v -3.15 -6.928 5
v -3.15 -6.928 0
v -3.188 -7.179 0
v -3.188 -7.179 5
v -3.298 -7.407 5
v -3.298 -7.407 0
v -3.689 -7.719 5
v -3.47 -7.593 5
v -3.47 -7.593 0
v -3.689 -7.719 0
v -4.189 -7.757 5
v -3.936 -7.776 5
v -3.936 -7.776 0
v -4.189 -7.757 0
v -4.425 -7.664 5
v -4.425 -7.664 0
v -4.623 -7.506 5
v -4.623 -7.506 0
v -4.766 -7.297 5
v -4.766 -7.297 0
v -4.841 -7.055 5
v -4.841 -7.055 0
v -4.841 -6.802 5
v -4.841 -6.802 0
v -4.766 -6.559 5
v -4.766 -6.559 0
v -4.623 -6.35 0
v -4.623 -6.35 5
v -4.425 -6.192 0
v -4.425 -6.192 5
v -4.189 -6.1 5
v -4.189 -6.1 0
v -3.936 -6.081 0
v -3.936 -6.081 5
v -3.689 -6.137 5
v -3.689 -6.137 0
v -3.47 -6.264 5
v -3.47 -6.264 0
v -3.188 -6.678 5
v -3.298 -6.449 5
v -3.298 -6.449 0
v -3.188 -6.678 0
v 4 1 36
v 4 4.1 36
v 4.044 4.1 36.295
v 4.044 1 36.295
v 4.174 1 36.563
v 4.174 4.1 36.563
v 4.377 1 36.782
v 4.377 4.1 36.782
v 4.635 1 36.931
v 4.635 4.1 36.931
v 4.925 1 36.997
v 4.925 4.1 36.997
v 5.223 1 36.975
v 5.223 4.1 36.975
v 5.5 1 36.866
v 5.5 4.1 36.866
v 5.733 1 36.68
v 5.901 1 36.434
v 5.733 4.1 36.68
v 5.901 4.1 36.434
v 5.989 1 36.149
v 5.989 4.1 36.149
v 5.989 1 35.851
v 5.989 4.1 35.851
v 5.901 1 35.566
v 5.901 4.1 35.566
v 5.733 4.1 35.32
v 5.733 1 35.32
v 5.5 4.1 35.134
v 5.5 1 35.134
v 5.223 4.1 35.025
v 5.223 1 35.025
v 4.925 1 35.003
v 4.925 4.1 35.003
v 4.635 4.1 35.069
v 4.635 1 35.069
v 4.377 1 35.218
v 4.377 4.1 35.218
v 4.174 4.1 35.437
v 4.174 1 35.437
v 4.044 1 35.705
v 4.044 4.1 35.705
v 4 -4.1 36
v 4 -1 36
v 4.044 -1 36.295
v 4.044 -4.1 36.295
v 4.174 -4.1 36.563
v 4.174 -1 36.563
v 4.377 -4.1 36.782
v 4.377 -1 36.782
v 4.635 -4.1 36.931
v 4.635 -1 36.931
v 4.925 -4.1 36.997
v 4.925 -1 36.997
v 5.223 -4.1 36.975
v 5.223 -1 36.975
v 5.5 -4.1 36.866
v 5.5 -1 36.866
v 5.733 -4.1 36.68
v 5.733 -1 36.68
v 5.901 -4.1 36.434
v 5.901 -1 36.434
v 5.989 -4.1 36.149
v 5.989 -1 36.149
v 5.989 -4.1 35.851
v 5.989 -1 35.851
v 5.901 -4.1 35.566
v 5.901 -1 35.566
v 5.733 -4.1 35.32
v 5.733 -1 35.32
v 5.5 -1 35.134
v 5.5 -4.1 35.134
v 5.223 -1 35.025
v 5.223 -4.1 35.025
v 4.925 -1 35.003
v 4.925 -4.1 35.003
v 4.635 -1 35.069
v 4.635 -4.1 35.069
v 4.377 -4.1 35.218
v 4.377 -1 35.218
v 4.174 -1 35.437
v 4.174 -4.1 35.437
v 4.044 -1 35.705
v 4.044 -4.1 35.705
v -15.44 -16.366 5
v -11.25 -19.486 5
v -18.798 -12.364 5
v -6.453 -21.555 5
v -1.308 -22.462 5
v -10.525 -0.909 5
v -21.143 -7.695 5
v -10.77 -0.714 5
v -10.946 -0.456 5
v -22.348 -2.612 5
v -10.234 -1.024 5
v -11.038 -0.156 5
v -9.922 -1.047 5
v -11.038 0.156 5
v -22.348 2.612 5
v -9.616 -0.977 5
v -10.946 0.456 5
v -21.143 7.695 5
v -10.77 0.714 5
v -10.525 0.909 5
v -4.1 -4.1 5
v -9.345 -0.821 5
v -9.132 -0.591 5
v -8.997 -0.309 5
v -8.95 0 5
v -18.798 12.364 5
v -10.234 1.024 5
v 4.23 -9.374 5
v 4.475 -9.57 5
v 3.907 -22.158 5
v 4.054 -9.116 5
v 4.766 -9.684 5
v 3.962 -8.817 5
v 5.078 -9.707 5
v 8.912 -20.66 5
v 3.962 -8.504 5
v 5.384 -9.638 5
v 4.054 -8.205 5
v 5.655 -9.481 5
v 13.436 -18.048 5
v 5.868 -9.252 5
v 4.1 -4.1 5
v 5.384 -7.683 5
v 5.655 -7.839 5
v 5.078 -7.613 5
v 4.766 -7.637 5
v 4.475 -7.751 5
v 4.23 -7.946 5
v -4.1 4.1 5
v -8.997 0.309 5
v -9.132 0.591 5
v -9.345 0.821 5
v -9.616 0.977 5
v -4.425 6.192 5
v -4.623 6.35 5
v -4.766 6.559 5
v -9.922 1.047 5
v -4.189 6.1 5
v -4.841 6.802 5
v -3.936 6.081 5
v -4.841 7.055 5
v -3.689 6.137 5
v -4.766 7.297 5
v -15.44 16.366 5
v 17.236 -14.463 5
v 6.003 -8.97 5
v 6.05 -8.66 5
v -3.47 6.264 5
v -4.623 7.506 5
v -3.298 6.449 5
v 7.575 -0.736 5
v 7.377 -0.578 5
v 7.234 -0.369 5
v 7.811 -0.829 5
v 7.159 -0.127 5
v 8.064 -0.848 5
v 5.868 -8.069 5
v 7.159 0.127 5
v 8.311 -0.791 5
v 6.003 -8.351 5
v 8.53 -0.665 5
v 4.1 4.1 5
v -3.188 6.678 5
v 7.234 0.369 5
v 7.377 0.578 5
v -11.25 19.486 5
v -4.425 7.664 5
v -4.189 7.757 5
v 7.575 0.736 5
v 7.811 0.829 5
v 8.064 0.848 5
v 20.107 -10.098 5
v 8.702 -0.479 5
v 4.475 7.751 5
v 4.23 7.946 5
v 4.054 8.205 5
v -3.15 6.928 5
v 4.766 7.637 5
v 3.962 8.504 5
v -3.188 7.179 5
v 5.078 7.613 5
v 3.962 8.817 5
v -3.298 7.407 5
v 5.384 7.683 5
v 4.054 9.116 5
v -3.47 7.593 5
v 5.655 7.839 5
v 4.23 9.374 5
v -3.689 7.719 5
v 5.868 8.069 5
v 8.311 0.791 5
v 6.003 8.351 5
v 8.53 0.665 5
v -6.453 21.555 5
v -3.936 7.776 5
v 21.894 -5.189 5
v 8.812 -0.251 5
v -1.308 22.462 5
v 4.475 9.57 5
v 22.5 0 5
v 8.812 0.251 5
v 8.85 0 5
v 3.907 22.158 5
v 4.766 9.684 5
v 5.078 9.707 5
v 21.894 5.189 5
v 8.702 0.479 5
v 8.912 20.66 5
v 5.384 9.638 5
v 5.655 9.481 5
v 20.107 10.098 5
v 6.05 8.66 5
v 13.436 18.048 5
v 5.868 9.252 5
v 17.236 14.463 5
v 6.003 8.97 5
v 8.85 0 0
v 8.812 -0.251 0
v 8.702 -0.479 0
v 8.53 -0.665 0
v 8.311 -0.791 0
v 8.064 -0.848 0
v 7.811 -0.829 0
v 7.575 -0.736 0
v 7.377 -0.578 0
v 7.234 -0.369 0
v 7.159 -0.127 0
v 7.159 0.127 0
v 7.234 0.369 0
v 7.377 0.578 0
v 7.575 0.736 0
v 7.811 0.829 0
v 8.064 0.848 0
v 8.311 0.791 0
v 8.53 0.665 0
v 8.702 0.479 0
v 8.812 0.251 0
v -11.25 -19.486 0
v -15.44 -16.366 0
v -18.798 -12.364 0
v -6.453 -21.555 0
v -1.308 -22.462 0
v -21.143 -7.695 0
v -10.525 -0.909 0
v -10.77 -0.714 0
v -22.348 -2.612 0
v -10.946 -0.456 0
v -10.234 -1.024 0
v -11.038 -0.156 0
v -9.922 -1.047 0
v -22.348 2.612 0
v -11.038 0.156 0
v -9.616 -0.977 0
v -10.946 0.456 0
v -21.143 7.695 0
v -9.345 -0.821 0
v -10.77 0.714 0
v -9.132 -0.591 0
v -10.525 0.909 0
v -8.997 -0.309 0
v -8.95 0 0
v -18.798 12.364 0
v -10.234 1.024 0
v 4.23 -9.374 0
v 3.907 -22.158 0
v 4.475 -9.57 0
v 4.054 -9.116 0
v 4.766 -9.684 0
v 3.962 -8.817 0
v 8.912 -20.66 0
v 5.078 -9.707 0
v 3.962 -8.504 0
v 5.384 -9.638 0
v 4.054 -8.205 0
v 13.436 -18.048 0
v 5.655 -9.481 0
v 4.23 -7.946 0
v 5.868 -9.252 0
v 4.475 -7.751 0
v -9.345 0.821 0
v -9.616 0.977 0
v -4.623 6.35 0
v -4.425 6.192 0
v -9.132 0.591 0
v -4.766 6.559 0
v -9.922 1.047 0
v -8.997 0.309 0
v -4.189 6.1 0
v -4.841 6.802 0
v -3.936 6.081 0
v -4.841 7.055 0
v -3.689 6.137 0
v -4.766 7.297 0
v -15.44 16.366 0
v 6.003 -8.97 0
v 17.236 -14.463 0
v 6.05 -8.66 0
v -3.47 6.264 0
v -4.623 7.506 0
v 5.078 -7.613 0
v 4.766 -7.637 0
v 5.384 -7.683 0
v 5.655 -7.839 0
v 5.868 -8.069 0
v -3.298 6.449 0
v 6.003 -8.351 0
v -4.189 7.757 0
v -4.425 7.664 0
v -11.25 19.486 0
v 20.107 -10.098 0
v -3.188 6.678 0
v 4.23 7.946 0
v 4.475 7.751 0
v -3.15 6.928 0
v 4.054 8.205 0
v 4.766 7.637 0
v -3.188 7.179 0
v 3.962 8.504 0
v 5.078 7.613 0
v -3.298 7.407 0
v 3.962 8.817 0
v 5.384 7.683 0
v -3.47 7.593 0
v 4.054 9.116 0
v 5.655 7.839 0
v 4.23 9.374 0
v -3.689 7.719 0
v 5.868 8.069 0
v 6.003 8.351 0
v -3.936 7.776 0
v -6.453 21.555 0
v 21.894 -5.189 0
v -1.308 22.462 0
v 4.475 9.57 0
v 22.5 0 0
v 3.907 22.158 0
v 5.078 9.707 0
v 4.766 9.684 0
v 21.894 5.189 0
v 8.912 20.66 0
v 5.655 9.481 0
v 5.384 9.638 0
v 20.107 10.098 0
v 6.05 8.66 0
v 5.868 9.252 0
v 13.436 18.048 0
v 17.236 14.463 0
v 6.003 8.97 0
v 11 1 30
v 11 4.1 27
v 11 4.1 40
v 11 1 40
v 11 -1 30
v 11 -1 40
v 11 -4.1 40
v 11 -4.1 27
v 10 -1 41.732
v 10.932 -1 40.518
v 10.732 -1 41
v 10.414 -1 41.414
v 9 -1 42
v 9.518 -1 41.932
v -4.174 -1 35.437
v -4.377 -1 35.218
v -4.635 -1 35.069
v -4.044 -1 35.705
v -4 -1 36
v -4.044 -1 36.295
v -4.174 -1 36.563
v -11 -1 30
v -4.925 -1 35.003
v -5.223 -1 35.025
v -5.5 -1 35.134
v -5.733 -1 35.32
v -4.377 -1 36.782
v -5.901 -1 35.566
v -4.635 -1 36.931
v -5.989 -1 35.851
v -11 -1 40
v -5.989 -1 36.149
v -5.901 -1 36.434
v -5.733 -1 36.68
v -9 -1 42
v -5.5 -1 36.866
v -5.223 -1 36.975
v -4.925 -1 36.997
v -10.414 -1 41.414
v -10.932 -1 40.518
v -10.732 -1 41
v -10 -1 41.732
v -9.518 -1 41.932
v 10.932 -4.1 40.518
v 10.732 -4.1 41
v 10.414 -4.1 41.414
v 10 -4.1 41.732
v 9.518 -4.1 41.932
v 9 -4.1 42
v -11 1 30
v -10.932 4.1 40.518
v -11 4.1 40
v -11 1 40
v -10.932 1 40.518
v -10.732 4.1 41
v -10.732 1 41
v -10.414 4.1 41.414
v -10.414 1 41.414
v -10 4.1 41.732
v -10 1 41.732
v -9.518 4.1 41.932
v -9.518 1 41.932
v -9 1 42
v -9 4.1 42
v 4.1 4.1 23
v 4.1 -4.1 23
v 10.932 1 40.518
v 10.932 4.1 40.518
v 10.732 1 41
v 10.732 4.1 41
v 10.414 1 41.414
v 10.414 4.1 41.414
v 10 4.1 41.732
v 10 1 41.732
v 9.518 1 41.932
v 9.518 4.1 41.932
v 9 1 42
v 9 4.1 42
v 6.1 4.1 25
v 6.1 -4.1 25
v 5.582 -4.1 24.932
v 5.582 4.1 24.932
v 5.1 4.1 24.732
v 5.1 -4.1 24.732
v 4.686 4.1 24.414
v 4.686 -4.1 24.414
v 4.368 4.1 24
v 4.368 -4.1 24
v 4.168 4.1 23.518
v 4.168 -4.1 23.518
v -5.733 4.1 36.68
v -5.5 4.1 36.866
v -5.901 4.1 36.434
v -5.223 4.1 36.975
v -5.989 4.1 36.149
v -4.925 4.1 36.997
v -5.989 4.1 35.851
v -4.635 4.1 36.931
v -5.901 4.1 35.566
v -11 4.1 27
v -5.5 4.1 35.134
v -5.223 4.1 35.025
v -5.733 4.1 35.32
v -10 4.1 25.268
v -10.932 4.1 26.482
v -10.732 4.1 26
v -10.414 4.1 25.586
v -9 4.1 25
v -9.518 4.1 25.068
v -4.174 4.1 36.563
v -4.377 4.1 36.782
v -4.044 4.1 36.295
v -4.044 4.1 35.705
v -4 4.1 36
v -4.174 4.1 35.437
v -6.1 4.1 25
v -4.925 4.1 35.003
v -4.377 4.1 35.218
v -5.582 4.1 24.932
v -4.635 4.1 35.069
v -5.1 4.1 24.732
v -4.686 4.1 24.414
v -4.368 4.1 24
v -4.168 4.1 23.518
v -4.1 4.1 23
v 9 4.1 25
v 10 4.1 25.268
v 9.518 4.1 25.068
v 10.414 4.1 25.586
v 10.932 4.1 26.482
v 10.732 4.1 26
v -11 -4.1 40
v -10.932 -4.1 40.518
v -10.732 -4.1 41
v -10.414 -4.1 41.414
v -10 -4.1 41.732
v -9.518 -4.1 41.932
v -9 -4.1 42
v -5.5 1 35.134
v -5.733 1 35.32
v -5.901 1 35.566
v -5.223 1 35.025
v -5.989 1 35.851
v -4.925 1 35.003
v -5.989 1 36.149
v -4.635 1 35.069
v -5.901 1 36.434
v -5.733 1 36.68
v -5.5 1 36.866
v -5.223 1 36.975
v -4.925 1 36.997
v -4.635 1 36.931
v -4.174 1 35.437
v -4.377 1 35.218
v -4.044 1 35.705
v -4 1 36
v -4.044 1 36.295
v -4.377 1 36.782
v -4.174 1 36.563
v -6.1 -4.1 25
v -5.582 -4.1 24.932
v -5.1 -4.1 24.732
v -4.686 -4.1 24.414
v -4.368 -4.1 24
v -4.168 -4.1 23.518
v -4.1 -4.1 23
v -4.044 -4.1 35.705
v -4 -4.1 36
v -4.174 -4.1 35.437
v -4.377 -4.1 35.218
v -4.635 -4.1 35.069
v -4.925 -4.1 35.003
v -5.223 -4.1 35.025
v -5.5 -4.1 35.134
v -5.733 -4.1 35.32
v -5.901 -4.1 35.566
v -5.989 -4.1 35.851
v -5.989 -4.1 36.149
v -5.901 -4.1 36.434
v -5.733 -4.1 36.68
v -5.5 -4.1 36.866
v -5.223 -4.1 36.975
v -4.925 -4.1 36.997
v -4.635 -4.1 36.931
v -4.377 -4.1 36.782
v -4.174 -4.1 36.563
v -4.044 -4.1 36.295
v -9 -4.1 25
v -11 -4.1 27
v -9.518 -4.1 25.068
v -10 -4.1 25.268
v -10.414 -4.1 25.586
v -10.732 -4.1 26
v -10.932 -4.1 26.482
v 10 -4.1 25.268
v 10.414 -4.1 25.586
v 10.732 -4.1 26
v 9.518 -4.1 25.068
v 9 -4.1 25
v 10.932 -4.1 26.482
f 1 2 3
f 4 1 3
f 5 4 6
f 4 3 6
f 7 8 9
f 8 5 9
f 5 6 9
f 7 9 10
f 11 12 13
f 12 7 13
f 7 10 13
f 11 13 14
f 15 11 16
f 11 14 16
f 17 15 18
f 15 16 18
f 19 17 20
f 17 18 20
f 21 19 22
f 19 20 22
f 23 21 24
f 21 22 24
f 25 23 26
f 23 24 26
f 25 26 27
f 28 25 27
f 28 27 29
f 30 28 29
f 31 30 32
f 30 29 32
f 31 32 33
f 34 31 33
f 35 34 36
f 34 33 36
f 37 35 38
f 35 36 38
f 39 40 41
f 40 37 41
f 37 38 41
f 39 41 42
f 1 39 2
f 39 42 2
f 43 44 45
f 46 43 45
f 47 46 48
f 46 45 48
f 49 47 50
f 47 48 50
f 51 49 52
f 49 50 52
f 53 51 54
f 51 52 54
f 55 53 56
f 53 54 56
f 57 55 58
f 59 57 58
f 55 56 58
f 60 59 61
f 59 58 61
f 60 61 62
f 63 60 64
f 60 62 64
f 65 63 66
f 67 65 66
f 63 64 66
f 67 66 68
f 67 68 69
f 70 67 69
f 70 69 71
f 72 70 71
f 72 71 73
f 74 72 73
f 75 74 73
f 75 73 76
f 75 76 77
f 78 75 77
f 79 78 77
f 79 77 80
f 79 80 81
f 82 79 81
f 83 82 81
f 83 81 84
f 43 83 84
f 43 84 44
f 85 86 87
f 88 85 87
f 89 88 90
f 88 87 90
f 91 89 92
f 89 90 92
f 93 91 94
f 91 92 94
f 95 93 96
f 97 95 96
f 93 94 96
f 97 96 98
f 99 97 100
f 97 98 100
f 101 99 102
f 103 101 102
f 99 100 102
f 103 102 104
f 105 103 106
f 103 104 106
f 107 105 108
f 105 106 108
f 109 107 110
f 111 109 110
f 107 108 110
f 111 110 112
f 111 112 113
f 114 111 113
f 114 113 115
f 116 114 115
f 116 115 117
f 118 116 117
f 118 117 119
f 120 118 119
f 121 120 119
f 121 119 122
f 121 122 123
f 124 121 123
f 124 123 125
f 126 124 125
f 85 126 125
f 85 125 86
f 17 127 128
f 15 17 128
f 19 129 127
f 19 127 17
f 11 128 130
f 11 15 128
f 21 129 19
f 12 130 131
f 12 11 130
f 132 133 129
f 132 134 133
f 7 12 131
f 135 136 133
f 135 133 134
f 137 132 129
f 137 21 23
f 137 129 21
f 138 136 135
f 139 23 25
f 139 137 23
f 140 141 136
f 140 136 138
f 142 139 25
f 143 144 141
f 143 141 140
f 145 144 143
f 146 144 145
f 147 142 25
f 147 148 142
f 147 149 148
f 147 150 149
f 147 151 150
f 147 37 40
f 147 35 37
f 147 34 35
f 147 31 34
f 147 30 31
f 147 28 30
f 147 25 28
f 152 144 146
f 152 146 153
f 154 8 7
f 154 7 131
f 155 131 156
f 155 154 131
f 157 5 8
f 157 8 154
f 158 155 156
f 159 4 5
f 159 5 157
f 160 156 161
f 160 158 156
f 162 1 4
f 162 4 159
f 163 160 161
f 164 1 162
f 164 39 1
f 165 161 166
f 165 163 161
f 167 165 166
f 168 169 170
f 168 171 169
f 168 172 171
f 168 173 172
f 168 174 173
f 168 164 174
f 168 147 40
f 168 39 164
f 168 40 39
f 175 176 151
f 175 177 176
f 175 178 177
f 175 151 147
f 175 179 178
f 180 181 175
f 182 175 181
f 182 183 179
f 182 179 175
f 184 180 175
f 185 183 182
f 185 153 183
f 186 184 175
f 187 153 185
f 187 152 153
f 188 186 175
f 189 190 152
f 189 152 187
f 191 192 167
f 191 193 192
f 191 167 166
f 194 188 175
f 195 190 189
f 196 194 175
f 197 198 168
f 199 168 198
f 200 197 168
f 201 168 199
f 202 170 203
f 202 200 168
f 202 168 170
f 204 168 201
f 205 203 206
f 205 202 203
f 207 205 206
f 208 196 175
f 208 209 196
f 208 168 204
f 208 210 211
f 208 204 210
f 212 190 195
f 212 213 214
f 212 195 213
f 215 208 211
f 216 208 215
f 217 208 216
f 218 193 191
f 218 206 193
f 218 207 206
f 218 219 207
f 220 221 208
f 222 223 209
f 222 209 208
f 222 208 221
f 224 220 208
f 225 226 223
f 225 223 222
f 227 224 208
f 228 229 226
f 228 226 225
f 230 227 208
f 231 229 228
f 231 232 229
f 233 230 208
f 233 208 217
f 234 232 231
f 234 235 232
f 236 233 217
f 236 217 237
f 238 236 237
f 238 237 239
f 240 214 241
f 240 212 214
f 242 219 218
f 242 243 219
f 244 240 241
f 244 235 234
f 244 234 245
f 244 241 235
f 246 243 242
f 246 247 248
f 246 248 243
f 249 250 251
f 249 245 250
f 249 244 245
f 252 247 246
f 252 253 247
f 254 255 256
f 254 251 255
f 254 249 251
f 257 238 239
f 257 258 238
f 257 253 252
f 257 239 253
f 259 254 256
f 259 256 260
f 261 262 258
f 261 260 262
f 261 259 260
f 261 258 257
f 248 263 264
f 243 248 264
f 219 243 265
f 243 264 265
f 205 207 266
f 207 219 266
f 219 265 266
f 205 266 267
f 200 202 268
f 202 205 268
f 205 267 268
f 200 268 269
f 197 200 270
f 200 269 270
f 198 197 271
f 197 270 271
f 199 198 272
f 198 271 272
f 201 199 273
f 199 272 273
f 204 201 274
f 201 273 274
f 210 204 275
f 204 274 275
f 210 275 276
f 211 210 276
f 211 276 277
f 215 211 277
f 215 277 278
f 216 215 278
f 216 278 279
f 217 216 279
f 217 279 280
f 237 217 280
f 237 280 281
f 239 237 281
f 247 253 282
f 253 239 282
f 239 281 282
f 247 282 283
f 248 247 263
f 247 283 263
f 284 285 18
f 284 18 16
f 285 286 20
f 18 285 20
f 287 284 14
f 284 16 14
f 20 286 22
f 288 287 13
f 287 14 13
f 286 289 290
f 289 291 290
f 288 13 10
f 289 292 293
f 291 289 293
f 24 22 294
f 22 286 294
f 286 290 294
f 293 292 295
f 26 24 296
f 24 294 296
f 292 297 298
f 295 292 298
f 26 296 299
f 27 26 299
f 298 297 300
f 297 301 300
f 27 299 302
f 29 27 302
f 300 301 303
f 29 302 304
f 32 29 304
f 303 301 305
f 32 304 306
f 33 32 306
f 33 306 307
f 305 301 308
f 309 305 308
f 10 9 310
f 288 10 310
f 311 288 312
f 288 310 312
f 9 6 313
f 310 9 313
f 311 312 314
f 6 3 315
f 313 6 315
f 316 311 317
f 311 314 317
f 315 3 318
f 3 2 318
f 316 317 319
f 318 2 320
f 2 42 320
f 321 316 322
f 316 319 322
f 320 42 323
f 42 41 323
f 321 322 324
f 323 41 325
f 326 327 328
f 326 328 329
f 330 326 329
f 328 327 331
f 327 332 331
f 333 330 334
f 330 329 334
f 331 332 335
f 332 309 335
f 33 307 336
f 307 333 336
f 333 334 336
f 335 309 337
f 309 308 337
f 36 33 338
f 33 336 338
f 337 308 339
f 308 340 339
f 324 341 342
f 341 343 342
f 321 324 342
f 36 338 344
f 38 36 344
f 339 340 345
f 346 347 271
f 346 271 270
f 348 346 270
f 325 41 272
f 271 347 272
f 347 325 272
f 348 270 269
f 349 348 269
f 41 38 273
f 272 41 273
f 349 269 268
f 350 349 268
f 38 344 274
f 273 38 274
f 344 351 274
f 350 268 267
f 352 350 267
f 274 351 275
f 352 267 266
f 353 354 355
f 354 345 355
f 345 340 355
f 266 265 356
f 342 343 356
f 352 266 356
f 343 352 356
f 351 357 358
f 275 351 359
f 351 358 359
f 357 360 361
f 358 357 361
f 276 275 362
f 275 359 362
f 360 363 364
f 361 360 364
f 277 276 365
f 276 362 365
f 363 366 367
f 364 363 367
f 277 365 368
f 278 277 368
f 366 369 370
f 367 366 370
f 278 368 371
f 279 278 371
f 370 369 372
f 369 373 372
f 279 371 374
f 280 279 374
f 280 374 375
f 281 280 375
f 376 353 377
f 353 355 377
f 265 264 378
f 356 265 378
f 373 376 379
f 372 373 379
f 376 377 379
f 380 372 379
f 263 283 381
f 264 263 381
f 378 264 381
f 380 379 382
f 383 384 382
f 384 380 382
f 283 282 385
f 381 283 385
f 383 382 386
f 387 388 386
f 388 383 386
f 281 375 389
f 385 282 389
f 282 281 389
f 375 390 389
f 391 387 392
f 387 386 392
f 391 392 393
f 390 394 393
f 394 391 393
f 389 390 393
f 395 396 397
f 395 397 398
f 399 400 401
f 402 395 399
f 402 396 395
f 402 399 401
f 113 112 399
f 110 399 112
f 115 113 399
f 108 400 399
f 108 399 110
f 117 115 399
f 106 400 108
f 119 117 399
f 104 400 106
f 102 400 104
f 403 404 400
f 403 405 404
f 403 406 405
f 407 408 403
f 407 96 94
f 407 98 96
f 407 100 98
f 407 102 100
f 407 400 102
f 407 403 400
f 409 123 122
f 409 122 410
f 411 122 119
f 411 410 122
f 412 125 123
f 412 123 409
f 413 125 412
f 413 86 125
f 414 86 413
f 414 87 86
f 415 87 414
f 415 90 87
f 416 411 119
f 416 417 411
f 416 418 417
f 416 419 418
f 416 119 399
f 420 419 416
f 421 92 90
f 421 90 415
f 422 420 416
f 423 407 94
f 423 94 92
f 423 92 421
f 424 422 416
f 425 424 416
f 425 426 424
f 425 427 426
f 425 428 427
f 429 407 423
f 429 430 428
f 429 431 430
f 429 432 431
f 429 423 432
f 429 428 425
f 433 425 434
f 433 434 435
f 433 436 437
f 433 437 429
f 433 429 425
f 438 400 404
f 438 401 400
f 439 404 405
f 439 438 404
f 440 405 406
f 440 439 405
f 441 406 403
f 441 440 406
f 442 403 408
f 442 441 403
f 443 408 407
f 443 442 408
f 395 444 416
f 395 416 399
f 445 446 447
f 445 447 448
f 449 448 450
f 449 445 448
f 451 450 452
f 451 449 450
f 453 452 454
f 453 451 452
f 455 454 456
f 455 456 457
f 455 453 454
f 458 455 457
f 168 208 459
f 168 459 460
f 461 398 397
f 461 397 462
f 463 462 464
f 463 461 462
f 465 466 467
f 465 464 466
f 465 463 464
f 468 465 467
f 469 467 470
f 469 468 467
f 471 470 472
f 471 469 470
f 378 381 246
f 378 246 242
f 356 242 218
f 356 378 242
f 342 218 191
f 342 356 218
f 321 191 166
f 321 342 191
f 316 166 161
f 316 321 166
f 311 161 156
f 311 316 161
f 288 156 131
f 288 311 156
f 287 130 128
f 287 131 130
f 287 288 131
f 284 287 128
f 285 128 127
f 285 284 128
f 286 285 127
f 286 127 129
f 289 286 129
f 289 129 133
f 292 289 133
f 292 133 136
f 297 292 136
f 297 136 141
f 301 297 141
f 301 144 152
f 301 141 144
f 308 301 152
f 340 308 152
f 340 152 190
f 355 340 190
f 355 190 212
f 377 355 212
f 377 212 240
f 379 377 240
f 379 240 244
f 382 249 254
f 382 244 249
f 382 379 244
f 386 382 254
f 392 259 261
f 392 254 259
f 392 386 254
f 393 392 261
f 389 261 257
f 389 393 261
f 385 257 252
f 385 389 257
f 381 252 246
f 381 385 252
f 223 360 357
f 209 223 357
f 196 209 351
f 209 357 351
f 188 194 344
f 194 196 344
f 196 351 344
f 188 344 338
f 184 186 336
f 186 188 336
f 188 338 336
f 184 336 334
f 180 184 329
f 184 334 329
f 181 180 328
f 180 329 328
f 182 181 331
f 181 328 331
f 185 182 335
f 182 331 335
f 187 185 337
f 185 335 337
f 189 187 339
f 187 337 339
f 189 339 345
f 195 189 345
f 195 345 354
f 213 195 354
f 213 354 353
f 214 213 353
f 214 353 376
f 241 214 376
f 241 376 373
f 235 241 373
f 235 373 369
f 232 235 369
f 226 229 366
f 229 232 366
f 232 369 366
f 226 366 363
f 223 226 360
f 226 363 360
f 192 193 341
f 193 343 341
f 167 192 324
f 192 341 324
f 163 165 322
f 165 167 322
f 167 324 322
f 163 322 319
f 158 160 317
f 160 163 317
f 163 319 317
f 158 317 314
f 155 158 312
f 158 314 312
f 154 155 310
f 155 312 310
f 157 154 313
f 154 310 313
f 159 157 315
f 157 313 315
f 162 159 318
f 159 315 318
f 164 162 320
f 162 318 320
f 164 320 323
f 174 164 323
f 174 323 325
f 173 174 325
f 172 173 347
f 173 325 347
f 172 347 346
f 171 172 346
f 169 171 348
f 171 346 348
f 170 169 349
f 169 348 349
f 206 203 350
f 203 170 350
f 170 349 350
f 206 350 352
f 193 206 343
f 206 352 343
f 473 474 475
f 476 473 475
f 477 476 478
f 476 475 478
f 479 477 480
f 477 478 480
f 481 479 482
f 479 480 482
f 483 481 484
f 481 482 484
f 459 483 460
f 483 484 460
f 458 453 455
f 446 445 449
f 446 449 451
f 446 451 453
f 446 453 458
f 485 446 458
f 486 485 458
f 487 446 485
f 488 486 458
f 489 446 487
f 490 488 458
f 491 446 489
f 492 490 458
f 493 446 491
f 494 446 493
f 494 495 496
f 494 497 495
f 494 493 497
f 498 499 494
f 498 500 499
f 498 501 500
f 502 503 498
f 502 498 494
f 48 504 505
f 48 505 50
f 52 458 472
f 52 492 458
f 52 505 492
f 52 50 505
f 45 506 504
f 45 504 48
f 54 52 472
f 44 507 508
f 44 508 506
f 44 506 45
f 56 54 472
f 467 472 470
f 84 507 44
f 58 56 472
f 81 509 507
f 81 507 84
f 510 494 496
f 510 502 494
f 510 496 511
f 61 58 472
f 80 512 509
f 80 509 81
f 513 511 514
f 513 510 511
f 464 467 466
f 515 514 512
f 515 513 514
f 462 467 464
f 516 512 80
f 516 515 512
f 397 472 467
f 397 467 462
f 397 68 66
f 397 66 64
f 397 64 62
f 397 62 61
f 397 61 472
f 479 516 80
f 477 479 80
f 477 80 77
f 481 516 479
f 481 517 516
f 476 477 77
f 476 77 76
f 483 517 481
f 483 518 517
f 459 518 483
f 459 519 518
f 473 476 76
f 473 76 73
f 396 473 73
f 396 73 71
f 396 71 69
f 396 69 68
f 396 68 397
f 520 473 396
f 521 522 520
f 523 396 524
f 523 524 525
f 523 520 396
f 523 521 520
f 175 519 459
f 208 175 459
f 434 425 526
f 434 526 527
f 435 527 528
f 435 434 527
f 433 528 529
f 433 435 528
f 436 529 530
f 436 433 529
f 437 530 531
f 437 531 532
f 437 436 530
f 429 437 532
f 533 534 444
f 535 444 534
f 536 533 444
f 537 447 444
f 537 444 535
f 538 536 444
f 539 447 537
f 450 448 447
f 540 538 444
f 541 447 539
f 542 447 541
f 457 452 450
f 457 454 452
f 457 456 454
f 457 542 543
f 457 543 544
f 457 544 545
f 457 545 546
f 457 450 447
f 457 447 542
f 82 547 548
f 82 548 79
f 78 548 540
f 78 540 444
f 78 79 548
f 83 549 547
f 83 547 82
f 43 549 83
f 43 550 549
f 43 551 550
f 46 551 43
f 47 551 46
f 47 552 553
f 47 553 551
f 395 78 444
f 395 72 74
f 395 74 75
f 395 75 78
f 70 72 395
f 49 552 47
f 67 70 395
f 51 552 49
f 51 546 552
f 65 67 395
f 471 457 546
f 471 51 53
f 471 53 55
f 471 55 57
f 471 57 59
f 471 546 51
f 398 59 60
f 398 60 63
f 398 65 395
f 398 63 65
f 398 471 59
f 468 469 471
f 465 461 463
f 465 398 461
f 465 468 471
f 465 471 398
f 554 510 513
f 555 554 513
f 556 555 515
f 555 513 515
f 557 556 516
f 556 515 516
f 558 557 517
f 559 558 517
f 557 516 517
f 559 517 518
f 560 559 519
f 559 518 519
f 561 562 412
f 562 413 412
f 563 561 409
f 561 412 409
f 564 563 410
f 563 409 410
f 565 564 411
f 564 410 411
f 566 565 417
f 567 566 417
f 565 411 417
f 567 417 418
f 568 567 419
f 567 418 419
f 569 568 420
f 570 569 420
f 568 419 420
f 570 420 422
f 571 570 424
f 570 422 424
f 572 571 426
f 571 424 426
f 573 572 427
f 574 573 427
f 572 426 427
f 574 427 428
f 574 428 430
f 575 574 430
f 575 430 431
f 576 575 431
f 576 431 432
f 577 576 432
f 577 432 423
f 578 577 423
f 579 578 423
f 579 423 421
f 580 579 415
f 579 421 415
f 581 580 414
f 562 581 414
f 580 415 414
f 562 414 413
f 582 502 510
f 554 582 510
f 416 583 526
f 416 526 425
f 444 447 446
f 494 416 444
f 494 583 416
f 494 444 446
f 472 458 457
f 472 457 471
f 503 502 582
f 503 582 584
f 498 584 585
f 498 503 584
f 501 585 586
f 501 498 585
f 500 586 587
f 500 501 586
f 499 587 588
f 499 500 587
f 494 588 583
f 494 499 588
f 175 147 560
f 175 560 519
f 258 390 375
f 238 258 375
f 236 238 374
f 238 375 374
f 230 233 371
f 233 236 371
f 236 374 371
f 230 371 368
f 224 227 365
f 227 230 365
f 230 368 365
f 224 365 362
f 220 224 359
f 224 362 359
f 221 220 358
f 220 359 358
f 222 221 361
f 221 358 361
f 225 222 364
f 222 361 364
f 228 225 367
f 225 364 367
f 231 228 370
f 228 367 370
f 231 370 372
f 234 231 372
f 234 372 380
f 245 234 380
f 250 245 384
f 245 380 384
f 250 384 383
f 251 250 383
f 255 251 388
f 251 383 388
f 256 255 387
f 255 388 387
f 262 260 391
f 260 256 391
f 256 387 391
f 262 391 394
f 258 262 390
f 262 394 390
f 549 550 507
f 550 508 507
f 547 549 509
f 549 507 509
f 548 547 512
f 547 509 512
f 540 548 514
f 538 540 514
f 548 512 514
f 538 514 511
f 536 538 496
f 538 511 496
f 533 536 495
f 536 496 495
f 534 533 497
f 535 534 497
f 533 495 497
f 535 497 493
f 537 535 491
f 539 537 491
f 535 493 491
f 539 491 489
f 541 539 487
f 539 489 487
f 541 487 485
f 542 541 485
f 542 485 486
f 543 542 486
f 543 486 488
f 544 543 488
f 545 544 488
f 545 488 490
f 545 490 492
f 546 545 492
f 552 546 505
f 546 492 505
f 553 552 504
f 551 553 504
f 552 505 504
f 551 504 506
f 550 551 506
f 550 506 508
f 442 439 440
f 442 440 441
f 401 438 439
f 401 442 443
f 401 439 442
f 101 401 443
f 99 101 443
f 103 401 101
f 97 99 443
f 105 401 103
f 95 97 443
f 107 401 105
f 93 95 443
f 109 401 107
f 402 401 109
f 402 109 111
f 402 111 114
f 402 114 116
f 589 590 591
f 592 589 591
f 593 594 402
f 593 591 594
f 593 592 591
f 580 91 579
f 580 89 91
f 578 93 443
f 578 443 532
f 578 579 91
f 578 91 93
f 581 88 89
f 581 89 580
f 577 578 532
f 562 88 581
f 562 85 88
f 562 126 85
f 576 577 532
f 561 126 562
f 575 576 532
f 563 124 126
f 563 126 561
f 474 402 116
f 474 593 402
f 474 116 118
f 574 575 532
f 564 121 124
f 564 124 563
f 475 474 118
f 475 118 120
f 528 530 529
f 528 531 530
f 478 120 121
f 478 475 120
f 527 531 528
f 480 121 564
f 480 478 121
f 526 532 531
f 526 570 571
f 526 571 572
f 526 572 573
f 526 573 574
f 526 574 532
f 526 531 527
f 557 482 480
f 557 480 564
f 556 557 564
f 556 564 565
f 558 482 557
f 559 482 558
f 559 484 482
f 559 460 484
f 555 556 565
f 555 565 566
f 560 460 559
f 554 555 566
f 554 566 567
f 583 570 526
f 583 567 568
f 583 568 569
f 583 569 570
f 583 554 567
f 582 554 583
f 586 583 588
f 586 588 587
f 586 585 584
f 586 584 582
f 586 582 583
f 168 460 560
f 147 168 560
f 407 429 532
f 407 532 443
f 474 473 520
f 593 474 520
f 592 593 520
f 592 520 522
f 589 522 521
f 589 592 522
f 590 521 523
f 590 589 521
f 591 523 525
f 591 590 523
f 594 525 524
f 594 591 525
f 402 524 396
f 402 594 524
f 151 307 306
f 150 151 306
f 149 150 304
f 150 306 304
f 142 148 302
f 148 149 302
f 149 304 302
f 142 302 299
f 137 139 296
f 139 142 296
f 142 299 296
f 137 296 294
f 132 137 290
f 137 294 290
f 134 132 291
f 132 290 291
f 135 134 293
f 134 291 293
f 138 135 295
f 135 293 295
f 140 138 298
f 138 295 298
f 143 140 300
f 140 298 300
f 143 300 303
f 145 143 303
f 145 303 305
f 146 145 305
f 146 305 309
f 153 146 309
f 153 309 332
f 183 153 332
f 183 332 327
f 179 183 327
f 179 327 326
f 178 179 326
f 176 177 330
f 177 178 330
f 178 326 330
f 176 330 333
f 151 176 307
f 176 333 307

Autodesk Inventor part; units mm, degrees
ref_plane "YZ Plane" through (0, 0, 0) normal (1, 0, 0) x (0, 1, 0)
ref_plane "XZ Plane" through (0, 0, 0) normal (0, 1, 0) x (-1, 0, 0)
ref_plane "XY Plane" through (0, 0, 0) normal (0, 0, 1) x (1, 0, 0)
sketch "Sketch1" plane through (0, 0, 0) normal (0, 0, 1) x (1, 0, 0)
  circle A0 centre (0, 0) radius 22.5
  circle A1 centre (-10, 0) radius 1.05
  circle A2 centre (8, 0) radius 0.85
  circle A3 centre (5, -8.6603) radius 1.05
  circle A4 centre (5, 8.6603) radius 1.05
  circle A5 centre (-4, 6.9282) radius 0.85
  circle A6 centre (-4, -6.9282) radius 0.85
  dimension "d0" = 45
  dimension "d1" = 1.7
  dimension "d2" = 2.1
  dimension "d3" = 10
  dimension "d4" = 8
  dimension "d7" = 360
  dimension "d11" = 360
extrude "Extrusion1" add sketch "Sketch1" along normal blind 5
sketch "Sketch2" plane through (0, 0, 5) normal (0, 0, 1) x (1, 0, 0)
  line L0 (-4.1, -4.1) -> (4.1, -4.1)
  line L1 (4.1, -4.1) -> (4.1, 4.1)
  line L2 (4.1, 4.1) -> (-4.1, 4.1)
  line L3 (-4.1, 4.1) -> (-4.1, -4.1)
  line L4 (-4.1, -4.1) -> (4.1, 4.1) construction
  line L5 (4.1, -4.1) -> (-4.1, 4.1) construction
  point P0 (0, 0)
  dimension "d15" = 8.2
  dimension "d16" = 8.2
extrude "Extrusion2" cut sketch "Sketch2" against normal blind 3
sketch "Sketch3" plane through (0, 0, 5) normal (0, 0, 1) x (1, 0, 0)
  line L0 (4.1, 4.1) -> (4.1, -4.1) projected
  line L1 (-4.1, 4.1) -> (4.1, 4.1) projected
  line L2 (-4.1, -4.1) -> (-4.1, 4.1) projected
  line L3 (4.1, -4.1) -> (-4.1, -4.1) projected
  point P0 (0, 0)
extrude "Extrusion3" add sketch "Sketch3" along normal blind 20 and the other way blind 3
sketch "Sketch4" plane through (0, 0, 25) normal (0, 0, 1) x (1, 0, 0)
  line L0 (-11, 4.1) -> (11, 4.1)
  line L1 (11, 4.1) -> (11, -4.1)
  line L2 (11, -4.1) -> (-11, -4.1)
  line L3 (-11, -4.1) -> (-11, 4.1)
  line L4 (-11, 4.1) -> (11, -4.1) construction
  line L5 (11, 4.1) -> (-11, -4.1) construction
  point P0 (0, 0)
  dimension "d23" = 22
  dimension "d24" = 8.2
extrude "Extrusion4" add sketch "Sketch4" along normal blind 17
sketch "Sketch5" plane through (0, 0, 42) normal (0, 0, 1) x (1, 0, 0)
  line L0 (11, -4.1) -> (11, 4.1) projected
  line L1 (-11, 1) -> (11, 1)
  line L2 (11, 1) -> (11, -1)
  line L3 (11, -1) -> (-11, -1)
  line L4 (-11, -1) -> (-11, 1)
  line L5 (-11, 1) -> (11, -1) construction
  line L6 (11, 1) -> (-11, -1) construction
  point P0 (0, 0)
  dimension "d27" = 2
extrude "Extrusion5" cut sketch "Sketch5" against normal blind 12
sketch "Sketch6" plane through (-4.1, 4.1, 5) normal (0, 1, 0) x (1, 0, 0)
  circle A0 centre (-0.9, -31) radius 1
  line L0 (-6.9, -20) -> (-6.9, -37) projected
  line L1 (15.1, -37) -> (-6.9, -37) projected
  point P0 (4.1, 5)
  dimension "d30" = 6
  dimension "d31" = 6
  dimension "d32" = 2
extrude "Extrusion6" cut sketch "Sketch6" against normal through all
mirror "Mirror1" about plane through (0, 0, 0) normal (1, 0, 0) of "Extrusion6"
fillet "Fillet1" radius 2 8 edges at (11, 2.55, 42) (11, -2.55, 42) (11, 0, 25) (4.1, 0, 25) (-4.1, 0, 25) (-11, 0, 25) (-11, -2.55, 42) (-11, 2.55, 42)
properties part number "WTS_RW_base"
